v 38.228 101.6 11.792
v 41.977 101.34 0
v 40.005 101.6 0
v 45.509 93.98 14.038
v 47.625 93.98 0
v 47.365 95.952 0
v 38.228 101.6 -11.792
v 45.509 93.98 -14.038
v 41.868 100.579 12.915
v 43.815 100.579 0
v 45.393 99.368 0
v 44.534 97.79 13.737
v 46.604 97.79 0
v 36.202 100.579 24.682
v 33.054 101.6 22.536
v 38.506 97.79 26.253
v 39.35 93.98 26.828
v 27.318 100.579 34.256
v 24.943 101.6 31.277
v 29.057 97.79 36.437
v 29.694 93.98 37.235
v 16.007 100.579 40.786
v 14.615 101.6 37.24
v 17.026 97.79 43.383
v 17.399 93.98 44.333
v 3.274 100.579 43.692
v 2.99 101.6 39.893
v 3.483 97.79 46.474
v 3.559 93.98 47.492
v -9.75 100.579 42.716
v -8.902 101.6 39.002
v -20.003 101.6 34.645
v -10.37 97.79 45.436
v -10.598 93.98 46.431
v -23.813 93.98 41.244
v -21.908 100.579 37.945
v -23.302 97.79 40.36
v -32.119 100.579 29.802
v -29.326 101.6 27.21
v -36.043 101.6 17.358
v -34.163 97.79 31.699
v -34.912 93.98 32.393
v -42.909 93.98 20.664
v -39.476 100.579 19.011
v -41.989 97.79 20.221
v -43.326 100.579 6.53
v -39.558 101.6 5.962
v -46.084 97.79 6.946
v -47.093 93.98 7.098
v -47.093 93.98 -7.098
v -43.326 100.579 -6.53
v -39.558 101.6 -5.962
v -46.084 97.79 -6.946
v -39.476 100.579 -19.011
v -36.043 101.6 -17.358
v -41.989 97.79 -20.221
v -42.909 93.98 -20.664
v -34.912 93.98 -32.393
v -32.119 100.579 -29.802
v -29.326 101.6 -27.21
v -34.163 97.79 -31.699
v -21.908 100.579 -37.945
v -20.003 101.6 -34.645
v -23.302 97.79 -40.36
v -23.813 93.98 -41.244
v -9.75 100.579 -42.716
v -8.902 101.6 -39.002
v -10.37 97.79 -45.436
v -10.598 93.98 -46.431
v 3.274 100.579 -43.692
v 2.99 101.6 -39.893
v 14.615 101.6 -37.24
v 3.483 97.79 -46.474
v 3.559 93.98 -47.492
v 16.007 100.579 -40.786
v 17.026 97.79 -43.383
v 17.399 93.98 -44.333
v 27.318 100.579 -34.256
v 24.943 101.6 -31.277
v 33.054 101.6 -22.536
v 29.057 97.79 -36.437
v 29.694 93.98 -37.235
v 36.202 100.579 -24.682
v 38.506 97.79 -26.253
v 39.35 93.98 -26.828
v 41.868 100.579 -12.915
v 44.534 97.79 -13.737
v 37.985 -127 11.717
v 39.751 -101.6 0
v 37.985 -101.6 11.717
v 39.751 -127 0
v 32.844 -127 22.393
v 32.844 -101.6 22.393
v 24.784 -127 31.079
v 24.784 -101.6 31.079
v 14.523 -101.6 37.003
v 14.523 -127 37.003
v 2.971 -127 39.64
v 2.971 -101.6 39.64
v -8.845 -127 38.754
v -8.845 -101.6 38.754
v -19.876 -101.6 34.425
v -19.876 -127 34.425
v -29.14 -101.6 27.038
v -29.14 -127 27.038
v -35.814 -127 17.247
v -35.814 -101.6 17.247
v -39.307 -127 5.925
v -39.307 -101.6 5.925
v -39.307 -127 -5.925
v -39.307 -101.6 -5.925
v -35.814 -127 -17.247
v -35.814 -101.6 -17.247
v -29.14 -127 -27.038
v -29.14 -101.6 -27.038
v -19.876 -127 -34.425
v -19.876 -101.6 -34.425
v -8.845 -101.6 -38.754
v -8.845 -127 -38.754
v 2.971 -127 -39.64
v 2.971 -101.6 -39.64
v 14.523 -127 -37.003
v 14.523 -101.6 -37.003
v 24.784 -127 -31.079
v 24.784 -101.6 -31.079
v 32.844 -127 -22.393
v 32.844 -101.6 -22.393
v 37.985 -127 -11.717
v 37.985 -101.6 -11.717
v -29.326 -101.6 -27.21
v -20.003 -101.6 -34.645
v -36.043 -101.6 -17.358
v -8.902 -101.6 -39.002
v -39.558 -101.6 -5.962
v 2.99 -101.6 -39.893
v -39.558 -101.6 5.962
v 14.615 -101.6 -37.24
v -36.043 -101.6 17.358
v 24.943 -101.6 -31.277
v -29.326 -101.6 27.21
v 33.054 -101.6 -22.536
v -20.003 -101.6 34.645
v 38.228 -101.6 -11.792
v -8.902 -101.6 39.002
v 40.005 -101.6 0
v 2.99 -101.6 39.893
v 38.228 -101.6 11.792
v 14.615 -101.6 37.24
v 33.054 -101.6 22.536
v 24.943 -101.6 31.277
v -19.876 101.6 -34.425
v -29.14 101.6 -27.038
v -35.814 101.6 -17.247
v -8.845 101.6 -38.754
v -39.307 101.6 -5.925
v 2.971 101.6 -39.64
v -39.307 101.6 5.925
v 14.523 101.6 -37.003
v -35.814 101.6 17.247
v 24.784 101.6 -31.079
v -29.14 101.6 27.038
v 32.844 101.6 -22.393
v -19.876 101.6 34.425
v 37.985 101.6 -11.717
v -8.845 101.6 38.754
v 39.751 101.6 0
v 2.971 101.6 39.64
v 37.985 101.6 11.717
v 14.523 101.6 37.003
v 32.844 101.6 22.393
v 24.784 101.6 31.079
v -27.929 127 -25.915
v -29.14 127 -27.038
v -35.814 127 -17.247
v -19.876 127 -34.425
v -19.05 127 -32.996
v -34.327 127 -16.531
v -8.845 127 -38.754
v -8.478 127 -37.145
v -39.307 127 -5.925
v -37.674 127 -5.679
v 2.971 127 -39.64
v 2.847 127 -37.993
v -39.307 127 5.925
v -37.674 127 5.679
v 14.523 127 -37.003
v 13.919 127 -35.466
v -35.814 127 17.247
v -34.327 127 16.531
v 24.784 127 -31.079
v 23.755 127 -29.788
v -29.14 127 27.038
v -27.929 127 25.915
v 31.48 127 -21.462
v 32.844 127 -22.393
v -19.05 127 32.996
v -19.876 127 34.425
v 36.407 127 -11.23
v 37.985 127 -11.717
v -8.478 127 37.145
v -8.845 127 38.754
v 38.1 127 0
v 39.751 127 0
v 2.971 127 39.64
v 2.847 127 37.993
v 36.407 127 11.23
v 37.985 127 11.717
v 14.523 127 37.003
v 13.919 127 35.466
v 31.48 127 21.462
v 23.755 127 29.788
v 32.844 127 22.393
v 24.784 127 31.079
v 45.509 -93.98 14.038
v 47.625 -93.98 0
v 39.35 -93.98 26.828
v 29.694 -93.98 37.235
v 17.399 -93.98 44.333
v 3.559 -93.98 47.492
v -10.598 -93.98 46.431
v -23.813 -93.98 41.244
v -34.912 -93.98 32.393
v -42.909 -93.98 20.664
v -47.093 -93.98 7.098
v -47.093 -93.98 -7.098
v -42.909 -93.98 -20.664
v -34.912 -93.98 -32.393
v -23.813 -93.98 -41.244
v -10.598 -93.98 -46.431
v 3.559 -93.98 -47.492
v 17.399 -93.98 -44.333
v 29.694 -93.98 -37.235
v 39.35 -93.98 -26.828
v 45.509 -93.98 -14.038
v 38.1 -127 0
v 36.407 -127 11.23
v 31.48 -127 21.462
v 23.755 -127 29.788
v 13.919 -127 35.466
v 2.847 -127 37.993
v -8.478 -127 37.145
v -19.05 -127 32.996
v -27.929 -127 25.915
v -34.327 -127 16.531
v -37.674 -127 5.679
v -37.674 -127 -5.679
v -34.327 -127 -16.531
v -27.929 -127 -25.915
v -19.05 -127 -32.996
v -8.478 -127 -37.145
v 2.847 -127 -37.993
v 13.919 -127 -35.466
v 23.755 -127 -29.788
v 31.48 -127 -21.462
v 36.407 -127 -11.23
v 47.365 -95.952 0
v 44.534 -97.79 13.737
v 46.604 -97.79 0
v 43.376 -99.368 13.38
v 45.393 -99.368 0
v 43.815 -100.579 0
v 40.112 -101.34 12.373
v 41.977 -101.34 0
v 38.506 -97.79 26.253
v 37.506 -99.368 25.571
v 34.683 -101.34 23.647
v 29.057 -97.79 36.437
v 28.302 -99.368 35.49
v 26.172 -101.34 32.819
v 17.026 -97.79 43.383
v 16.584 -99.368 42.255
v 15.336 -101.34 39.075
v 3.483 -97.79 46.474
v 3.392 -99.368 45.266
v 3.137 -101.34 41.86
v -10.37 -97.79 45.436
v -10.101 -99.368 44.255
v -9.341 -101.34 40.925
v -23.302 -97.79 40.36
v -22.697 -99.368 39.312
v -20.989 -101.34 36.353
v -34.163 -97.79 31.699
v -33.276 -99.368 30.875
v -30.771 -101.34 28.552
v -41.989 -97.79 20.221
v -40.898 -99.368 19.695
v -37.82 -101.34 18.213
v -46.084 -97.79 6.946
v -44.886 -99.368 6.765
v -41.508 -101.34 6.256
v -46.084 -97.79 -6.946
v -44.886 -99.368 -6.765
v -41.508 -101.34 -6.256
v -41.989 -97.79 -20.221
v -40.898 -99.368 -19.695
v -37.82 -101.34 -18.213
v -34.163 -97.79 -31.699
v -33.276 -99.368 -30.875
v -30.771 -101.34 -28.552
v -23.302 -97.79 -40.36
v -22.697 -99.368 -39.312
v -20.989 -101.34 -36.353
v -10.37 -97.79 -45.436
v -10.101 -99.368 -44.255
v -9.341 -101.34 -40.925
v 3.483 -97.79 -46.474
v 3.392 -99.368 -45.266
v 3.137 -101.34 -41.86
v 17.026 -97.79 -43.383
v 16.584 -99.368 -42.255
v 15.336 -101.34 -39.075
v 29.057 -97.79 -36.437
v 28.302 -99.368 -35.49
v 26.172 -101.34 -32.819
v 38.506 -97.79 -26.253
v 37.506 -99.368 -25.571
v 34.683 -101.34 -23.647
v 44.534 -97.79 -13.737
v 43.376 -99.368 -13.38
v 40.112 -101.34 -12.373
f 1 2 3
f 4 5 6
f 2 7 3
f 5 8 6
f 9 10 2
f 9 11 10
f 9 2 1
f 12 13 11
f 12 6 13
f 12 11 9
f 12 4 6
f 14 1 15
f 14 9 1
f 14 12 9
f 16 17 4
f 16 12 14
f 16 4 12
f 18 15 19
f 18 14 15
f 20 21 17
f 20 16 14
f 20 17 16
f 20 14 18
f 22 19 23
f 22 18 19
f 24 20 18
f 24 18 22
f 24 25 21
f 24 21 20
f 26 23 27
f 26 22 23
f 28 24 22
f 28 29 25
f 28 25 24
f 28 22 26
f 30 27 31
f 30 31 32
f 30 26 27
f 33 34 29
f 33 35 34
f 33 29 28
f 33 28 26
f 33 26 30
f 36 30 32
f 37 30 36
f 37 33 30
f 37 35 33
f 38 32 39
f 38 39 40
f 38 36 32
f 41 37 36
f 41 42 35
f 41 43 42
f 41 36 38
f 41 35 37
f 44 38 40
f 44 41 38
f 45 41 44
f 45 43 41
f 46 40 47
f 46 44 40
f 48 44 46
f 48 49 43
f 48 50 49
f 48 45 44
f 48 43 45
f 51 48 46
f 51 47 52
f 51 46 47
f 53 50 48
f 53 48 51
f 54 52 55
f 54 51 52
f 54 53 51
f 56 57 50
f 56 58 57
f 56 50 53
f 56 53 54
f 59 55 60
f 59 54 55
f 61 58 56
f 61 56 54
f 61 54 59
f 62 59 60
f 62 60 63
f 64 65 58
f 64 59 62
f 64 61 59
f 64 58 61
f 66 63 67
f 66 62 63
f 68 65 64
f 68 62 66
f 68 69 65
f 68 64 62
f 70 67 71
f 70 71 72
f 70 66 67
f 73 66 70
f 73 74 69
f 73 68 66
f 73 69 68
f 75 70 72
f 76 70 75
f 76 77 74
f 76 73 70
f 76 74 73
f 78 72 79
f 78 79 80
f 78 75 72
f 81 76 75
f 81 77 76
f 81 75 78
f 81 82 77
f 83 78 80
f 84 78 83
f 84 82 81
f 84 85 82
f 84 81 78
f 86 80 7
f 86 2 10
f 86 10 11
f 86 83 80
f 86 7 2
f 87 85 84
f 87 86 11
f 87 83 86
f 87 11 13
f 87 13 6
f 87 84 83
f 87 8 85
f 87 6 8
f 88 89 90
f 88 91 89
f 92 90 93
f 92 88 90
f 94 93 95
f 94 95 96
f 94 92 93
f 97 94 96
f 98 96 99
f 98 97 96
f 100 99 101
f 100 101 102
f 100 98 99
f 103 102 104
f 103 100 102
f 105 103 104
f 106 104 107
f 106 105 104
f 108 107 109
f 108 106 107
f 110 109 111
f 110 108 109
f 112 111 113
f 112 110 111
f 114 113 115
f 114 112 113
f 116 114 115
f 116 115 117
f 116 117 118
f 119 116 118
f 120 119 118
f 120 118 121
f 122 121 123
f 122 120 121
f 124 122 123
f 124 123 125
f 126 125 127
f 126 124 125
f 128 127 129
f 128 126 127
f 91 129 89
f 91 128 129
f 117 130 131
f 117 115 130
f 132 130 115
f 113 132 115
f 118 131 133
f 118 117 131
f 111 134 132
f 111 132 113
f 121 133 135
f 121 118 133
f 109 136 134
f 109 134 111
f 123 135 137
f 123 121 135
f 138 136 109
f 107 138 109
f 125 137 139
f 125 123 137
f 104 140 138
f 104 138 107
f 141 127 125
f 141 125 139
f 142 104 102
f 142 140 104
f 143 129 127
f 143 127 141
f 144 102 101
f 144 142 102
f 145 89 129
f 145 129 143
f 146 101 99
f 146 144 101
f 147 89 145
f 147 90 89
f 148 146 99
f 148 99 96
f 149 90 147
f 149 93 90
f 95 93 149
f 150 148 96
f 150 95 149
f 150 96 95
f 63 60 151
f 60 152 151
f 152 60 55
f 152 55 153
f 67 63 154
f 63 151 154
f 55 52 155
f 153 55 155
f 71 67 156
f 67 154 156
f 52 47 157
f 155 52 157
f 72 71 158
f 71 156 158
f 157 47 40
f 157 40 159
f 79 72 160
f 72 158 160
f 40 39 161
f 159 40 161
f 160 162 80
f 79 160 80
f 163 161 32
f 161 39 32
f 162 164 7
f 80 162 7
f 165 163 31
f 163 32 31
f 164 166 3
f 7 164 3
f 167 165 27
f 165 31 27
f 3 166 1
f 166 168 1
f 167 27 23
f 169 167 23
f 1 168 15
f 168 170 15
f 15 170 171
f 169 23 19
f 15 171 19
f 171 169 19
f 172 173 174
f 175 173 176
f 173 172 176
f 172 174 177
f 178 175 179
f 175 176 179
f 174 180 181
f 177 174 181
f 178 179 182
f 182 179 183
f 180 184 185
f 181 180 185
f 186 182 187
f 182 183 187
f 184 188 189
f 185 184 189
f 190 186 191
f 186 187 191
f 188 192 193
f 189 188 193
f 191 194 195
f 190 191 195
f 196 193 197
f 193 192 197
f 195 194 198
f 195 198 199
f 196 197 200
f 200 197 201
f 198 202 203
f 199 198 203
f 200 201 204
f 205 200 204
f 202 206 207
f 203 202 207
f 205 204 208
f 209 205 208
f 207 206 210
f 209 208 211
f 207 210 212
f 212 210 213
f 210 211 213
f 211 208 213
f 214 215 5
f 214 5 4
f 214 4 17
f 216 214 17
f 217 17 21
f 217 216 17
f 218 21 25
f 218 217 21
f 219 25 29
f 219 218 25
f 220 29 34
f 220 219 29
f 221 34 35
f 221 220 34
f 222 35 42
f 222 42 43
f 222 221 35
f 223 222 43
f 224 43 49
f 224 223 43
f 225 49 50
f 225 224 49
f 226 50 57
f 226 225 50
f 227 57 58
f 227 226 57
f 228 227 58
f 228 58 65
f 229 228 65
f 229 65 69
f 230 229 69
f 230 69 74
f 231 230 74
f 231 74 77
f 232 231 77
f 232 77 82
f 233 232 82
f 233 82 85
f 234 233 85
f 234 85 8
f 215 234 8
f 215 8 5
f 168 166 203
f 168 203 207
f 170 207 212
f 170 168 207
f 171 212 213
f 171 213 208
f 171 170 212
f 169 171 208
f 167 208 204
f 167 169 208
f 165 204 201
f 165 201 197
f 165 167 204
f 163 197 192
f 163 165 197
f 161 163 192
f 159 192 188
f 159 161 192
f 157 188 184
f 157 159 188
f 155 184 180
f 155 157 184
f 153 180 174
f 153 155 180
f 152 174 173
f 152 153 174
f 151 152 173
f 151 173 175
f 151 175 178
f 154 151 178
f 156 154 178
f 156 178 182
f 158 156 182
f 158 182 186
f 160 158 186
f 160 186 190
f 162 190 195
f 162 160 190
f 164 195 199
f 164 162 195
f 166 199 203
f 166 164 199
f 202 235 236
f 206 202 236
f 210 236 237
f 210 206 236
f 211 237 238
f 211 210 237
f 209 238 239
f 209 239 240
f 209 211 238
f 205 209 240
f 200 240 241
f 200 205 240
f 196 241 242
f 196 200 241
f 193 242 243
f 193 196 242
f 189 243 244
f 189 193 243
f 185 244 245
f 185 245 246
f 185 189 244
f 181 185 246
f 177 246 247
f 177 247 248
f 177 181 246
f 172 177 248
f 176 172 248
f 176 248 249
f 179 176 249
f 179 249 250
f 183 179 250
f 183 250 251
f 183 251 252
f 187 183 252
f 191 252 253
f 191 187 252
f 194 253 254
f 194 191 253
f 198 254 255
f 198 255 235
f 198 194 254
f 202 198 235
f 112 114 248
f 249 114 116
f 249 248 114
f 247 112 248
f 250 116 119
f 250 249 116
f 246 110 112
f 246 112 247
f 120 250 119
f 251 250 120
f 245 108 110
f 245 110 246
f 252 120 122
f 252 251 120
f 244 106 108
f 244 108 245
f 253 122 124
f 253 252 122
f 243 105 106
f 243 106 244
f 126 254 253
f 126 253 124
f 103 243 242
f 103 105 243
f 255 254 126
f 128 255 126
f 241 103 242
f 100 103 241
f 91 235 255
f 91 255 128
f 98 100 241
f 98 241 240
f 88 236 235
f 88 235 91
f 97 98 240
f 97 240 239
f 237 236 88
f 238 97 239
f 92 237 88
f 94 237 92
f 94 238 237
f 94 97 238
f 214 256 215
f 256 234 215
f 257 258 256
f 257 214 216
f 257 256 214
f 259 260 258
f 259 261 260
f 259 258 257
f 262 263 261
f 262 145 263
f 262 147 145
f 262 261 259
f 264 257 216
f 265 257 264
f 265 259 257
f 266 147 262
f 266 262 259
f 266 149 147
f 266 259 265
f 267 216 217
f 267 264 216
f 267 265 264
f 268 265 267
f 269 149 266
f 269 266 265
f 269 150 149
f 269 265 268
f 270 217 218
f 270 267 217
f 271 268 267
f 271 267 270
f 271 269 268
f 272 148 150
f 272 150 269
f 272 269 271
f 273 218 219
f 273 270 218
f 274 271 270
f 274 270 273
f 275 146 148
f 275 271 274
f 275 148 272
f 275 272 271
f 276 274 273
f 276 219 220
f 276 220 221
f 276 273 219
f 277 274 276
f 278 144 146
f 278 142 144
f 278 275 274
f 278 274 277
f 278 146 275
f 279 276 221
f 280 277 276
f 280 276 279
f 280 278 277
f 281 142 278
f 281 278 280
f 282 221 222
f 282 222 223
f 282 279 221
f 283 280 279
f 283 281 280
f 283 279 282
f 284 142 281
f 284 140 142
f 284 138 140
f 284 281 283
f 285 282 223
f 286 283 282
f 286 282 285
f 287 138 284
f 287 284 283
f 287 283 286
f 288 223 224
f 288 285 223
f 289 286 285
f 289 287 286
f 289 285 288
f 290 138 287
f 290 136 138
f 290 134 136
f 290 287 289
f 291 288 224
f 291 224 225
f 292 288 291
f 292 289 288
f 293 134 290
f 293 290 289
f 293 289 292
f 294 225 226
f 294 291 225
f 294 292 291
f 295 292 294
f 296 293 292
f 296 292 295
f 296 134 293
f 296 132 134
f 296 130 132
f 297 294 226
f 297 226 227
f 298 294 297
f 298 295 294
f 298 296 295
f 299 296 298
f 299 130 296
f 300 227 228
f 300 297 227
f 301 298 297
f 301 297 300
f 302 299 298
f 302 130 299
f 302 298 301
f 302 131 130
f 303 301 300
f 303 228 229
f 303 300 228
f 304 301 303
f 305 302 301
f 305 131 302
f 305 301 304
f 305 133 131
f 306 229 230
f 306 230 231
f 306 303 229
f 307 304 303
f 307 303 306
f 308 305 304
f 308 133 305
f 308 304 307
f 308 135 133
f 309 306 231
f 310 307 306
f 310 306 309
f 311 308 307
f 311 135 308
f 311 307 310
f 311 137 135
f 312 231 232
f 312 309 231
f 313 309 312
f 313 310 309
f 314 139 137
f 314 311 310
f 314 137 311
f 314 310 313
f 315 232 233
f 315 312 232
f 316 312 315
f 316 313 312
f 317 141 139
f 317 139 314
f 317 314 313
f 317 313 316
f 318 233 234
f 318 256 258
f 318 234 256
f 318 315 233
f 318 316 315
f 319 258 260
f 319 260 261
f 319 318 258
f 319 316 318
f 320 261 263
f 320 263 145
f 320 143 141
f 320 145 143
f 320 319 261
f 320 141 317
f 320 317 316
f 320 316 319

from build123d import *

# Parameters (mm, degrees)
F0_R     = 39.751
F0_R_2   = 38.1
F1_DEPTH = 127
F2_R     = 47.625
F2_R_2   = 39.751
F3_DEPTH = 101.6
F4_R     = 7.62


with BuildPart() as f1:
    # F0 (on Front) → F1 (new body, symmetric)
    with BuildSketch(Plane.XZ):
        Circle(F0_R)
        Circle(F0_R_2, mode=Mode.SUBTRACT)
    extrude(amount=F1_DEPTH, both=True)

    # F2 (on Front) → F3 (join, symmetric)
    with BuildSketch(Plane.XZ):
        Circle(F2_R)
        Circle(F2_R_2, mode=Mode.SUBTRACT)
    extrude(amount=F3_DEPTH, both=True)

    # F4
    f4_edges = [f1.edges().sort_by_distance(p)[0] for p in [
        (-47.625, -101.6, 0),
        (-47.625, 101.6, 0),
    ]]
    fillet(f4_edges, radius=F4_R)


solid = f1.part
